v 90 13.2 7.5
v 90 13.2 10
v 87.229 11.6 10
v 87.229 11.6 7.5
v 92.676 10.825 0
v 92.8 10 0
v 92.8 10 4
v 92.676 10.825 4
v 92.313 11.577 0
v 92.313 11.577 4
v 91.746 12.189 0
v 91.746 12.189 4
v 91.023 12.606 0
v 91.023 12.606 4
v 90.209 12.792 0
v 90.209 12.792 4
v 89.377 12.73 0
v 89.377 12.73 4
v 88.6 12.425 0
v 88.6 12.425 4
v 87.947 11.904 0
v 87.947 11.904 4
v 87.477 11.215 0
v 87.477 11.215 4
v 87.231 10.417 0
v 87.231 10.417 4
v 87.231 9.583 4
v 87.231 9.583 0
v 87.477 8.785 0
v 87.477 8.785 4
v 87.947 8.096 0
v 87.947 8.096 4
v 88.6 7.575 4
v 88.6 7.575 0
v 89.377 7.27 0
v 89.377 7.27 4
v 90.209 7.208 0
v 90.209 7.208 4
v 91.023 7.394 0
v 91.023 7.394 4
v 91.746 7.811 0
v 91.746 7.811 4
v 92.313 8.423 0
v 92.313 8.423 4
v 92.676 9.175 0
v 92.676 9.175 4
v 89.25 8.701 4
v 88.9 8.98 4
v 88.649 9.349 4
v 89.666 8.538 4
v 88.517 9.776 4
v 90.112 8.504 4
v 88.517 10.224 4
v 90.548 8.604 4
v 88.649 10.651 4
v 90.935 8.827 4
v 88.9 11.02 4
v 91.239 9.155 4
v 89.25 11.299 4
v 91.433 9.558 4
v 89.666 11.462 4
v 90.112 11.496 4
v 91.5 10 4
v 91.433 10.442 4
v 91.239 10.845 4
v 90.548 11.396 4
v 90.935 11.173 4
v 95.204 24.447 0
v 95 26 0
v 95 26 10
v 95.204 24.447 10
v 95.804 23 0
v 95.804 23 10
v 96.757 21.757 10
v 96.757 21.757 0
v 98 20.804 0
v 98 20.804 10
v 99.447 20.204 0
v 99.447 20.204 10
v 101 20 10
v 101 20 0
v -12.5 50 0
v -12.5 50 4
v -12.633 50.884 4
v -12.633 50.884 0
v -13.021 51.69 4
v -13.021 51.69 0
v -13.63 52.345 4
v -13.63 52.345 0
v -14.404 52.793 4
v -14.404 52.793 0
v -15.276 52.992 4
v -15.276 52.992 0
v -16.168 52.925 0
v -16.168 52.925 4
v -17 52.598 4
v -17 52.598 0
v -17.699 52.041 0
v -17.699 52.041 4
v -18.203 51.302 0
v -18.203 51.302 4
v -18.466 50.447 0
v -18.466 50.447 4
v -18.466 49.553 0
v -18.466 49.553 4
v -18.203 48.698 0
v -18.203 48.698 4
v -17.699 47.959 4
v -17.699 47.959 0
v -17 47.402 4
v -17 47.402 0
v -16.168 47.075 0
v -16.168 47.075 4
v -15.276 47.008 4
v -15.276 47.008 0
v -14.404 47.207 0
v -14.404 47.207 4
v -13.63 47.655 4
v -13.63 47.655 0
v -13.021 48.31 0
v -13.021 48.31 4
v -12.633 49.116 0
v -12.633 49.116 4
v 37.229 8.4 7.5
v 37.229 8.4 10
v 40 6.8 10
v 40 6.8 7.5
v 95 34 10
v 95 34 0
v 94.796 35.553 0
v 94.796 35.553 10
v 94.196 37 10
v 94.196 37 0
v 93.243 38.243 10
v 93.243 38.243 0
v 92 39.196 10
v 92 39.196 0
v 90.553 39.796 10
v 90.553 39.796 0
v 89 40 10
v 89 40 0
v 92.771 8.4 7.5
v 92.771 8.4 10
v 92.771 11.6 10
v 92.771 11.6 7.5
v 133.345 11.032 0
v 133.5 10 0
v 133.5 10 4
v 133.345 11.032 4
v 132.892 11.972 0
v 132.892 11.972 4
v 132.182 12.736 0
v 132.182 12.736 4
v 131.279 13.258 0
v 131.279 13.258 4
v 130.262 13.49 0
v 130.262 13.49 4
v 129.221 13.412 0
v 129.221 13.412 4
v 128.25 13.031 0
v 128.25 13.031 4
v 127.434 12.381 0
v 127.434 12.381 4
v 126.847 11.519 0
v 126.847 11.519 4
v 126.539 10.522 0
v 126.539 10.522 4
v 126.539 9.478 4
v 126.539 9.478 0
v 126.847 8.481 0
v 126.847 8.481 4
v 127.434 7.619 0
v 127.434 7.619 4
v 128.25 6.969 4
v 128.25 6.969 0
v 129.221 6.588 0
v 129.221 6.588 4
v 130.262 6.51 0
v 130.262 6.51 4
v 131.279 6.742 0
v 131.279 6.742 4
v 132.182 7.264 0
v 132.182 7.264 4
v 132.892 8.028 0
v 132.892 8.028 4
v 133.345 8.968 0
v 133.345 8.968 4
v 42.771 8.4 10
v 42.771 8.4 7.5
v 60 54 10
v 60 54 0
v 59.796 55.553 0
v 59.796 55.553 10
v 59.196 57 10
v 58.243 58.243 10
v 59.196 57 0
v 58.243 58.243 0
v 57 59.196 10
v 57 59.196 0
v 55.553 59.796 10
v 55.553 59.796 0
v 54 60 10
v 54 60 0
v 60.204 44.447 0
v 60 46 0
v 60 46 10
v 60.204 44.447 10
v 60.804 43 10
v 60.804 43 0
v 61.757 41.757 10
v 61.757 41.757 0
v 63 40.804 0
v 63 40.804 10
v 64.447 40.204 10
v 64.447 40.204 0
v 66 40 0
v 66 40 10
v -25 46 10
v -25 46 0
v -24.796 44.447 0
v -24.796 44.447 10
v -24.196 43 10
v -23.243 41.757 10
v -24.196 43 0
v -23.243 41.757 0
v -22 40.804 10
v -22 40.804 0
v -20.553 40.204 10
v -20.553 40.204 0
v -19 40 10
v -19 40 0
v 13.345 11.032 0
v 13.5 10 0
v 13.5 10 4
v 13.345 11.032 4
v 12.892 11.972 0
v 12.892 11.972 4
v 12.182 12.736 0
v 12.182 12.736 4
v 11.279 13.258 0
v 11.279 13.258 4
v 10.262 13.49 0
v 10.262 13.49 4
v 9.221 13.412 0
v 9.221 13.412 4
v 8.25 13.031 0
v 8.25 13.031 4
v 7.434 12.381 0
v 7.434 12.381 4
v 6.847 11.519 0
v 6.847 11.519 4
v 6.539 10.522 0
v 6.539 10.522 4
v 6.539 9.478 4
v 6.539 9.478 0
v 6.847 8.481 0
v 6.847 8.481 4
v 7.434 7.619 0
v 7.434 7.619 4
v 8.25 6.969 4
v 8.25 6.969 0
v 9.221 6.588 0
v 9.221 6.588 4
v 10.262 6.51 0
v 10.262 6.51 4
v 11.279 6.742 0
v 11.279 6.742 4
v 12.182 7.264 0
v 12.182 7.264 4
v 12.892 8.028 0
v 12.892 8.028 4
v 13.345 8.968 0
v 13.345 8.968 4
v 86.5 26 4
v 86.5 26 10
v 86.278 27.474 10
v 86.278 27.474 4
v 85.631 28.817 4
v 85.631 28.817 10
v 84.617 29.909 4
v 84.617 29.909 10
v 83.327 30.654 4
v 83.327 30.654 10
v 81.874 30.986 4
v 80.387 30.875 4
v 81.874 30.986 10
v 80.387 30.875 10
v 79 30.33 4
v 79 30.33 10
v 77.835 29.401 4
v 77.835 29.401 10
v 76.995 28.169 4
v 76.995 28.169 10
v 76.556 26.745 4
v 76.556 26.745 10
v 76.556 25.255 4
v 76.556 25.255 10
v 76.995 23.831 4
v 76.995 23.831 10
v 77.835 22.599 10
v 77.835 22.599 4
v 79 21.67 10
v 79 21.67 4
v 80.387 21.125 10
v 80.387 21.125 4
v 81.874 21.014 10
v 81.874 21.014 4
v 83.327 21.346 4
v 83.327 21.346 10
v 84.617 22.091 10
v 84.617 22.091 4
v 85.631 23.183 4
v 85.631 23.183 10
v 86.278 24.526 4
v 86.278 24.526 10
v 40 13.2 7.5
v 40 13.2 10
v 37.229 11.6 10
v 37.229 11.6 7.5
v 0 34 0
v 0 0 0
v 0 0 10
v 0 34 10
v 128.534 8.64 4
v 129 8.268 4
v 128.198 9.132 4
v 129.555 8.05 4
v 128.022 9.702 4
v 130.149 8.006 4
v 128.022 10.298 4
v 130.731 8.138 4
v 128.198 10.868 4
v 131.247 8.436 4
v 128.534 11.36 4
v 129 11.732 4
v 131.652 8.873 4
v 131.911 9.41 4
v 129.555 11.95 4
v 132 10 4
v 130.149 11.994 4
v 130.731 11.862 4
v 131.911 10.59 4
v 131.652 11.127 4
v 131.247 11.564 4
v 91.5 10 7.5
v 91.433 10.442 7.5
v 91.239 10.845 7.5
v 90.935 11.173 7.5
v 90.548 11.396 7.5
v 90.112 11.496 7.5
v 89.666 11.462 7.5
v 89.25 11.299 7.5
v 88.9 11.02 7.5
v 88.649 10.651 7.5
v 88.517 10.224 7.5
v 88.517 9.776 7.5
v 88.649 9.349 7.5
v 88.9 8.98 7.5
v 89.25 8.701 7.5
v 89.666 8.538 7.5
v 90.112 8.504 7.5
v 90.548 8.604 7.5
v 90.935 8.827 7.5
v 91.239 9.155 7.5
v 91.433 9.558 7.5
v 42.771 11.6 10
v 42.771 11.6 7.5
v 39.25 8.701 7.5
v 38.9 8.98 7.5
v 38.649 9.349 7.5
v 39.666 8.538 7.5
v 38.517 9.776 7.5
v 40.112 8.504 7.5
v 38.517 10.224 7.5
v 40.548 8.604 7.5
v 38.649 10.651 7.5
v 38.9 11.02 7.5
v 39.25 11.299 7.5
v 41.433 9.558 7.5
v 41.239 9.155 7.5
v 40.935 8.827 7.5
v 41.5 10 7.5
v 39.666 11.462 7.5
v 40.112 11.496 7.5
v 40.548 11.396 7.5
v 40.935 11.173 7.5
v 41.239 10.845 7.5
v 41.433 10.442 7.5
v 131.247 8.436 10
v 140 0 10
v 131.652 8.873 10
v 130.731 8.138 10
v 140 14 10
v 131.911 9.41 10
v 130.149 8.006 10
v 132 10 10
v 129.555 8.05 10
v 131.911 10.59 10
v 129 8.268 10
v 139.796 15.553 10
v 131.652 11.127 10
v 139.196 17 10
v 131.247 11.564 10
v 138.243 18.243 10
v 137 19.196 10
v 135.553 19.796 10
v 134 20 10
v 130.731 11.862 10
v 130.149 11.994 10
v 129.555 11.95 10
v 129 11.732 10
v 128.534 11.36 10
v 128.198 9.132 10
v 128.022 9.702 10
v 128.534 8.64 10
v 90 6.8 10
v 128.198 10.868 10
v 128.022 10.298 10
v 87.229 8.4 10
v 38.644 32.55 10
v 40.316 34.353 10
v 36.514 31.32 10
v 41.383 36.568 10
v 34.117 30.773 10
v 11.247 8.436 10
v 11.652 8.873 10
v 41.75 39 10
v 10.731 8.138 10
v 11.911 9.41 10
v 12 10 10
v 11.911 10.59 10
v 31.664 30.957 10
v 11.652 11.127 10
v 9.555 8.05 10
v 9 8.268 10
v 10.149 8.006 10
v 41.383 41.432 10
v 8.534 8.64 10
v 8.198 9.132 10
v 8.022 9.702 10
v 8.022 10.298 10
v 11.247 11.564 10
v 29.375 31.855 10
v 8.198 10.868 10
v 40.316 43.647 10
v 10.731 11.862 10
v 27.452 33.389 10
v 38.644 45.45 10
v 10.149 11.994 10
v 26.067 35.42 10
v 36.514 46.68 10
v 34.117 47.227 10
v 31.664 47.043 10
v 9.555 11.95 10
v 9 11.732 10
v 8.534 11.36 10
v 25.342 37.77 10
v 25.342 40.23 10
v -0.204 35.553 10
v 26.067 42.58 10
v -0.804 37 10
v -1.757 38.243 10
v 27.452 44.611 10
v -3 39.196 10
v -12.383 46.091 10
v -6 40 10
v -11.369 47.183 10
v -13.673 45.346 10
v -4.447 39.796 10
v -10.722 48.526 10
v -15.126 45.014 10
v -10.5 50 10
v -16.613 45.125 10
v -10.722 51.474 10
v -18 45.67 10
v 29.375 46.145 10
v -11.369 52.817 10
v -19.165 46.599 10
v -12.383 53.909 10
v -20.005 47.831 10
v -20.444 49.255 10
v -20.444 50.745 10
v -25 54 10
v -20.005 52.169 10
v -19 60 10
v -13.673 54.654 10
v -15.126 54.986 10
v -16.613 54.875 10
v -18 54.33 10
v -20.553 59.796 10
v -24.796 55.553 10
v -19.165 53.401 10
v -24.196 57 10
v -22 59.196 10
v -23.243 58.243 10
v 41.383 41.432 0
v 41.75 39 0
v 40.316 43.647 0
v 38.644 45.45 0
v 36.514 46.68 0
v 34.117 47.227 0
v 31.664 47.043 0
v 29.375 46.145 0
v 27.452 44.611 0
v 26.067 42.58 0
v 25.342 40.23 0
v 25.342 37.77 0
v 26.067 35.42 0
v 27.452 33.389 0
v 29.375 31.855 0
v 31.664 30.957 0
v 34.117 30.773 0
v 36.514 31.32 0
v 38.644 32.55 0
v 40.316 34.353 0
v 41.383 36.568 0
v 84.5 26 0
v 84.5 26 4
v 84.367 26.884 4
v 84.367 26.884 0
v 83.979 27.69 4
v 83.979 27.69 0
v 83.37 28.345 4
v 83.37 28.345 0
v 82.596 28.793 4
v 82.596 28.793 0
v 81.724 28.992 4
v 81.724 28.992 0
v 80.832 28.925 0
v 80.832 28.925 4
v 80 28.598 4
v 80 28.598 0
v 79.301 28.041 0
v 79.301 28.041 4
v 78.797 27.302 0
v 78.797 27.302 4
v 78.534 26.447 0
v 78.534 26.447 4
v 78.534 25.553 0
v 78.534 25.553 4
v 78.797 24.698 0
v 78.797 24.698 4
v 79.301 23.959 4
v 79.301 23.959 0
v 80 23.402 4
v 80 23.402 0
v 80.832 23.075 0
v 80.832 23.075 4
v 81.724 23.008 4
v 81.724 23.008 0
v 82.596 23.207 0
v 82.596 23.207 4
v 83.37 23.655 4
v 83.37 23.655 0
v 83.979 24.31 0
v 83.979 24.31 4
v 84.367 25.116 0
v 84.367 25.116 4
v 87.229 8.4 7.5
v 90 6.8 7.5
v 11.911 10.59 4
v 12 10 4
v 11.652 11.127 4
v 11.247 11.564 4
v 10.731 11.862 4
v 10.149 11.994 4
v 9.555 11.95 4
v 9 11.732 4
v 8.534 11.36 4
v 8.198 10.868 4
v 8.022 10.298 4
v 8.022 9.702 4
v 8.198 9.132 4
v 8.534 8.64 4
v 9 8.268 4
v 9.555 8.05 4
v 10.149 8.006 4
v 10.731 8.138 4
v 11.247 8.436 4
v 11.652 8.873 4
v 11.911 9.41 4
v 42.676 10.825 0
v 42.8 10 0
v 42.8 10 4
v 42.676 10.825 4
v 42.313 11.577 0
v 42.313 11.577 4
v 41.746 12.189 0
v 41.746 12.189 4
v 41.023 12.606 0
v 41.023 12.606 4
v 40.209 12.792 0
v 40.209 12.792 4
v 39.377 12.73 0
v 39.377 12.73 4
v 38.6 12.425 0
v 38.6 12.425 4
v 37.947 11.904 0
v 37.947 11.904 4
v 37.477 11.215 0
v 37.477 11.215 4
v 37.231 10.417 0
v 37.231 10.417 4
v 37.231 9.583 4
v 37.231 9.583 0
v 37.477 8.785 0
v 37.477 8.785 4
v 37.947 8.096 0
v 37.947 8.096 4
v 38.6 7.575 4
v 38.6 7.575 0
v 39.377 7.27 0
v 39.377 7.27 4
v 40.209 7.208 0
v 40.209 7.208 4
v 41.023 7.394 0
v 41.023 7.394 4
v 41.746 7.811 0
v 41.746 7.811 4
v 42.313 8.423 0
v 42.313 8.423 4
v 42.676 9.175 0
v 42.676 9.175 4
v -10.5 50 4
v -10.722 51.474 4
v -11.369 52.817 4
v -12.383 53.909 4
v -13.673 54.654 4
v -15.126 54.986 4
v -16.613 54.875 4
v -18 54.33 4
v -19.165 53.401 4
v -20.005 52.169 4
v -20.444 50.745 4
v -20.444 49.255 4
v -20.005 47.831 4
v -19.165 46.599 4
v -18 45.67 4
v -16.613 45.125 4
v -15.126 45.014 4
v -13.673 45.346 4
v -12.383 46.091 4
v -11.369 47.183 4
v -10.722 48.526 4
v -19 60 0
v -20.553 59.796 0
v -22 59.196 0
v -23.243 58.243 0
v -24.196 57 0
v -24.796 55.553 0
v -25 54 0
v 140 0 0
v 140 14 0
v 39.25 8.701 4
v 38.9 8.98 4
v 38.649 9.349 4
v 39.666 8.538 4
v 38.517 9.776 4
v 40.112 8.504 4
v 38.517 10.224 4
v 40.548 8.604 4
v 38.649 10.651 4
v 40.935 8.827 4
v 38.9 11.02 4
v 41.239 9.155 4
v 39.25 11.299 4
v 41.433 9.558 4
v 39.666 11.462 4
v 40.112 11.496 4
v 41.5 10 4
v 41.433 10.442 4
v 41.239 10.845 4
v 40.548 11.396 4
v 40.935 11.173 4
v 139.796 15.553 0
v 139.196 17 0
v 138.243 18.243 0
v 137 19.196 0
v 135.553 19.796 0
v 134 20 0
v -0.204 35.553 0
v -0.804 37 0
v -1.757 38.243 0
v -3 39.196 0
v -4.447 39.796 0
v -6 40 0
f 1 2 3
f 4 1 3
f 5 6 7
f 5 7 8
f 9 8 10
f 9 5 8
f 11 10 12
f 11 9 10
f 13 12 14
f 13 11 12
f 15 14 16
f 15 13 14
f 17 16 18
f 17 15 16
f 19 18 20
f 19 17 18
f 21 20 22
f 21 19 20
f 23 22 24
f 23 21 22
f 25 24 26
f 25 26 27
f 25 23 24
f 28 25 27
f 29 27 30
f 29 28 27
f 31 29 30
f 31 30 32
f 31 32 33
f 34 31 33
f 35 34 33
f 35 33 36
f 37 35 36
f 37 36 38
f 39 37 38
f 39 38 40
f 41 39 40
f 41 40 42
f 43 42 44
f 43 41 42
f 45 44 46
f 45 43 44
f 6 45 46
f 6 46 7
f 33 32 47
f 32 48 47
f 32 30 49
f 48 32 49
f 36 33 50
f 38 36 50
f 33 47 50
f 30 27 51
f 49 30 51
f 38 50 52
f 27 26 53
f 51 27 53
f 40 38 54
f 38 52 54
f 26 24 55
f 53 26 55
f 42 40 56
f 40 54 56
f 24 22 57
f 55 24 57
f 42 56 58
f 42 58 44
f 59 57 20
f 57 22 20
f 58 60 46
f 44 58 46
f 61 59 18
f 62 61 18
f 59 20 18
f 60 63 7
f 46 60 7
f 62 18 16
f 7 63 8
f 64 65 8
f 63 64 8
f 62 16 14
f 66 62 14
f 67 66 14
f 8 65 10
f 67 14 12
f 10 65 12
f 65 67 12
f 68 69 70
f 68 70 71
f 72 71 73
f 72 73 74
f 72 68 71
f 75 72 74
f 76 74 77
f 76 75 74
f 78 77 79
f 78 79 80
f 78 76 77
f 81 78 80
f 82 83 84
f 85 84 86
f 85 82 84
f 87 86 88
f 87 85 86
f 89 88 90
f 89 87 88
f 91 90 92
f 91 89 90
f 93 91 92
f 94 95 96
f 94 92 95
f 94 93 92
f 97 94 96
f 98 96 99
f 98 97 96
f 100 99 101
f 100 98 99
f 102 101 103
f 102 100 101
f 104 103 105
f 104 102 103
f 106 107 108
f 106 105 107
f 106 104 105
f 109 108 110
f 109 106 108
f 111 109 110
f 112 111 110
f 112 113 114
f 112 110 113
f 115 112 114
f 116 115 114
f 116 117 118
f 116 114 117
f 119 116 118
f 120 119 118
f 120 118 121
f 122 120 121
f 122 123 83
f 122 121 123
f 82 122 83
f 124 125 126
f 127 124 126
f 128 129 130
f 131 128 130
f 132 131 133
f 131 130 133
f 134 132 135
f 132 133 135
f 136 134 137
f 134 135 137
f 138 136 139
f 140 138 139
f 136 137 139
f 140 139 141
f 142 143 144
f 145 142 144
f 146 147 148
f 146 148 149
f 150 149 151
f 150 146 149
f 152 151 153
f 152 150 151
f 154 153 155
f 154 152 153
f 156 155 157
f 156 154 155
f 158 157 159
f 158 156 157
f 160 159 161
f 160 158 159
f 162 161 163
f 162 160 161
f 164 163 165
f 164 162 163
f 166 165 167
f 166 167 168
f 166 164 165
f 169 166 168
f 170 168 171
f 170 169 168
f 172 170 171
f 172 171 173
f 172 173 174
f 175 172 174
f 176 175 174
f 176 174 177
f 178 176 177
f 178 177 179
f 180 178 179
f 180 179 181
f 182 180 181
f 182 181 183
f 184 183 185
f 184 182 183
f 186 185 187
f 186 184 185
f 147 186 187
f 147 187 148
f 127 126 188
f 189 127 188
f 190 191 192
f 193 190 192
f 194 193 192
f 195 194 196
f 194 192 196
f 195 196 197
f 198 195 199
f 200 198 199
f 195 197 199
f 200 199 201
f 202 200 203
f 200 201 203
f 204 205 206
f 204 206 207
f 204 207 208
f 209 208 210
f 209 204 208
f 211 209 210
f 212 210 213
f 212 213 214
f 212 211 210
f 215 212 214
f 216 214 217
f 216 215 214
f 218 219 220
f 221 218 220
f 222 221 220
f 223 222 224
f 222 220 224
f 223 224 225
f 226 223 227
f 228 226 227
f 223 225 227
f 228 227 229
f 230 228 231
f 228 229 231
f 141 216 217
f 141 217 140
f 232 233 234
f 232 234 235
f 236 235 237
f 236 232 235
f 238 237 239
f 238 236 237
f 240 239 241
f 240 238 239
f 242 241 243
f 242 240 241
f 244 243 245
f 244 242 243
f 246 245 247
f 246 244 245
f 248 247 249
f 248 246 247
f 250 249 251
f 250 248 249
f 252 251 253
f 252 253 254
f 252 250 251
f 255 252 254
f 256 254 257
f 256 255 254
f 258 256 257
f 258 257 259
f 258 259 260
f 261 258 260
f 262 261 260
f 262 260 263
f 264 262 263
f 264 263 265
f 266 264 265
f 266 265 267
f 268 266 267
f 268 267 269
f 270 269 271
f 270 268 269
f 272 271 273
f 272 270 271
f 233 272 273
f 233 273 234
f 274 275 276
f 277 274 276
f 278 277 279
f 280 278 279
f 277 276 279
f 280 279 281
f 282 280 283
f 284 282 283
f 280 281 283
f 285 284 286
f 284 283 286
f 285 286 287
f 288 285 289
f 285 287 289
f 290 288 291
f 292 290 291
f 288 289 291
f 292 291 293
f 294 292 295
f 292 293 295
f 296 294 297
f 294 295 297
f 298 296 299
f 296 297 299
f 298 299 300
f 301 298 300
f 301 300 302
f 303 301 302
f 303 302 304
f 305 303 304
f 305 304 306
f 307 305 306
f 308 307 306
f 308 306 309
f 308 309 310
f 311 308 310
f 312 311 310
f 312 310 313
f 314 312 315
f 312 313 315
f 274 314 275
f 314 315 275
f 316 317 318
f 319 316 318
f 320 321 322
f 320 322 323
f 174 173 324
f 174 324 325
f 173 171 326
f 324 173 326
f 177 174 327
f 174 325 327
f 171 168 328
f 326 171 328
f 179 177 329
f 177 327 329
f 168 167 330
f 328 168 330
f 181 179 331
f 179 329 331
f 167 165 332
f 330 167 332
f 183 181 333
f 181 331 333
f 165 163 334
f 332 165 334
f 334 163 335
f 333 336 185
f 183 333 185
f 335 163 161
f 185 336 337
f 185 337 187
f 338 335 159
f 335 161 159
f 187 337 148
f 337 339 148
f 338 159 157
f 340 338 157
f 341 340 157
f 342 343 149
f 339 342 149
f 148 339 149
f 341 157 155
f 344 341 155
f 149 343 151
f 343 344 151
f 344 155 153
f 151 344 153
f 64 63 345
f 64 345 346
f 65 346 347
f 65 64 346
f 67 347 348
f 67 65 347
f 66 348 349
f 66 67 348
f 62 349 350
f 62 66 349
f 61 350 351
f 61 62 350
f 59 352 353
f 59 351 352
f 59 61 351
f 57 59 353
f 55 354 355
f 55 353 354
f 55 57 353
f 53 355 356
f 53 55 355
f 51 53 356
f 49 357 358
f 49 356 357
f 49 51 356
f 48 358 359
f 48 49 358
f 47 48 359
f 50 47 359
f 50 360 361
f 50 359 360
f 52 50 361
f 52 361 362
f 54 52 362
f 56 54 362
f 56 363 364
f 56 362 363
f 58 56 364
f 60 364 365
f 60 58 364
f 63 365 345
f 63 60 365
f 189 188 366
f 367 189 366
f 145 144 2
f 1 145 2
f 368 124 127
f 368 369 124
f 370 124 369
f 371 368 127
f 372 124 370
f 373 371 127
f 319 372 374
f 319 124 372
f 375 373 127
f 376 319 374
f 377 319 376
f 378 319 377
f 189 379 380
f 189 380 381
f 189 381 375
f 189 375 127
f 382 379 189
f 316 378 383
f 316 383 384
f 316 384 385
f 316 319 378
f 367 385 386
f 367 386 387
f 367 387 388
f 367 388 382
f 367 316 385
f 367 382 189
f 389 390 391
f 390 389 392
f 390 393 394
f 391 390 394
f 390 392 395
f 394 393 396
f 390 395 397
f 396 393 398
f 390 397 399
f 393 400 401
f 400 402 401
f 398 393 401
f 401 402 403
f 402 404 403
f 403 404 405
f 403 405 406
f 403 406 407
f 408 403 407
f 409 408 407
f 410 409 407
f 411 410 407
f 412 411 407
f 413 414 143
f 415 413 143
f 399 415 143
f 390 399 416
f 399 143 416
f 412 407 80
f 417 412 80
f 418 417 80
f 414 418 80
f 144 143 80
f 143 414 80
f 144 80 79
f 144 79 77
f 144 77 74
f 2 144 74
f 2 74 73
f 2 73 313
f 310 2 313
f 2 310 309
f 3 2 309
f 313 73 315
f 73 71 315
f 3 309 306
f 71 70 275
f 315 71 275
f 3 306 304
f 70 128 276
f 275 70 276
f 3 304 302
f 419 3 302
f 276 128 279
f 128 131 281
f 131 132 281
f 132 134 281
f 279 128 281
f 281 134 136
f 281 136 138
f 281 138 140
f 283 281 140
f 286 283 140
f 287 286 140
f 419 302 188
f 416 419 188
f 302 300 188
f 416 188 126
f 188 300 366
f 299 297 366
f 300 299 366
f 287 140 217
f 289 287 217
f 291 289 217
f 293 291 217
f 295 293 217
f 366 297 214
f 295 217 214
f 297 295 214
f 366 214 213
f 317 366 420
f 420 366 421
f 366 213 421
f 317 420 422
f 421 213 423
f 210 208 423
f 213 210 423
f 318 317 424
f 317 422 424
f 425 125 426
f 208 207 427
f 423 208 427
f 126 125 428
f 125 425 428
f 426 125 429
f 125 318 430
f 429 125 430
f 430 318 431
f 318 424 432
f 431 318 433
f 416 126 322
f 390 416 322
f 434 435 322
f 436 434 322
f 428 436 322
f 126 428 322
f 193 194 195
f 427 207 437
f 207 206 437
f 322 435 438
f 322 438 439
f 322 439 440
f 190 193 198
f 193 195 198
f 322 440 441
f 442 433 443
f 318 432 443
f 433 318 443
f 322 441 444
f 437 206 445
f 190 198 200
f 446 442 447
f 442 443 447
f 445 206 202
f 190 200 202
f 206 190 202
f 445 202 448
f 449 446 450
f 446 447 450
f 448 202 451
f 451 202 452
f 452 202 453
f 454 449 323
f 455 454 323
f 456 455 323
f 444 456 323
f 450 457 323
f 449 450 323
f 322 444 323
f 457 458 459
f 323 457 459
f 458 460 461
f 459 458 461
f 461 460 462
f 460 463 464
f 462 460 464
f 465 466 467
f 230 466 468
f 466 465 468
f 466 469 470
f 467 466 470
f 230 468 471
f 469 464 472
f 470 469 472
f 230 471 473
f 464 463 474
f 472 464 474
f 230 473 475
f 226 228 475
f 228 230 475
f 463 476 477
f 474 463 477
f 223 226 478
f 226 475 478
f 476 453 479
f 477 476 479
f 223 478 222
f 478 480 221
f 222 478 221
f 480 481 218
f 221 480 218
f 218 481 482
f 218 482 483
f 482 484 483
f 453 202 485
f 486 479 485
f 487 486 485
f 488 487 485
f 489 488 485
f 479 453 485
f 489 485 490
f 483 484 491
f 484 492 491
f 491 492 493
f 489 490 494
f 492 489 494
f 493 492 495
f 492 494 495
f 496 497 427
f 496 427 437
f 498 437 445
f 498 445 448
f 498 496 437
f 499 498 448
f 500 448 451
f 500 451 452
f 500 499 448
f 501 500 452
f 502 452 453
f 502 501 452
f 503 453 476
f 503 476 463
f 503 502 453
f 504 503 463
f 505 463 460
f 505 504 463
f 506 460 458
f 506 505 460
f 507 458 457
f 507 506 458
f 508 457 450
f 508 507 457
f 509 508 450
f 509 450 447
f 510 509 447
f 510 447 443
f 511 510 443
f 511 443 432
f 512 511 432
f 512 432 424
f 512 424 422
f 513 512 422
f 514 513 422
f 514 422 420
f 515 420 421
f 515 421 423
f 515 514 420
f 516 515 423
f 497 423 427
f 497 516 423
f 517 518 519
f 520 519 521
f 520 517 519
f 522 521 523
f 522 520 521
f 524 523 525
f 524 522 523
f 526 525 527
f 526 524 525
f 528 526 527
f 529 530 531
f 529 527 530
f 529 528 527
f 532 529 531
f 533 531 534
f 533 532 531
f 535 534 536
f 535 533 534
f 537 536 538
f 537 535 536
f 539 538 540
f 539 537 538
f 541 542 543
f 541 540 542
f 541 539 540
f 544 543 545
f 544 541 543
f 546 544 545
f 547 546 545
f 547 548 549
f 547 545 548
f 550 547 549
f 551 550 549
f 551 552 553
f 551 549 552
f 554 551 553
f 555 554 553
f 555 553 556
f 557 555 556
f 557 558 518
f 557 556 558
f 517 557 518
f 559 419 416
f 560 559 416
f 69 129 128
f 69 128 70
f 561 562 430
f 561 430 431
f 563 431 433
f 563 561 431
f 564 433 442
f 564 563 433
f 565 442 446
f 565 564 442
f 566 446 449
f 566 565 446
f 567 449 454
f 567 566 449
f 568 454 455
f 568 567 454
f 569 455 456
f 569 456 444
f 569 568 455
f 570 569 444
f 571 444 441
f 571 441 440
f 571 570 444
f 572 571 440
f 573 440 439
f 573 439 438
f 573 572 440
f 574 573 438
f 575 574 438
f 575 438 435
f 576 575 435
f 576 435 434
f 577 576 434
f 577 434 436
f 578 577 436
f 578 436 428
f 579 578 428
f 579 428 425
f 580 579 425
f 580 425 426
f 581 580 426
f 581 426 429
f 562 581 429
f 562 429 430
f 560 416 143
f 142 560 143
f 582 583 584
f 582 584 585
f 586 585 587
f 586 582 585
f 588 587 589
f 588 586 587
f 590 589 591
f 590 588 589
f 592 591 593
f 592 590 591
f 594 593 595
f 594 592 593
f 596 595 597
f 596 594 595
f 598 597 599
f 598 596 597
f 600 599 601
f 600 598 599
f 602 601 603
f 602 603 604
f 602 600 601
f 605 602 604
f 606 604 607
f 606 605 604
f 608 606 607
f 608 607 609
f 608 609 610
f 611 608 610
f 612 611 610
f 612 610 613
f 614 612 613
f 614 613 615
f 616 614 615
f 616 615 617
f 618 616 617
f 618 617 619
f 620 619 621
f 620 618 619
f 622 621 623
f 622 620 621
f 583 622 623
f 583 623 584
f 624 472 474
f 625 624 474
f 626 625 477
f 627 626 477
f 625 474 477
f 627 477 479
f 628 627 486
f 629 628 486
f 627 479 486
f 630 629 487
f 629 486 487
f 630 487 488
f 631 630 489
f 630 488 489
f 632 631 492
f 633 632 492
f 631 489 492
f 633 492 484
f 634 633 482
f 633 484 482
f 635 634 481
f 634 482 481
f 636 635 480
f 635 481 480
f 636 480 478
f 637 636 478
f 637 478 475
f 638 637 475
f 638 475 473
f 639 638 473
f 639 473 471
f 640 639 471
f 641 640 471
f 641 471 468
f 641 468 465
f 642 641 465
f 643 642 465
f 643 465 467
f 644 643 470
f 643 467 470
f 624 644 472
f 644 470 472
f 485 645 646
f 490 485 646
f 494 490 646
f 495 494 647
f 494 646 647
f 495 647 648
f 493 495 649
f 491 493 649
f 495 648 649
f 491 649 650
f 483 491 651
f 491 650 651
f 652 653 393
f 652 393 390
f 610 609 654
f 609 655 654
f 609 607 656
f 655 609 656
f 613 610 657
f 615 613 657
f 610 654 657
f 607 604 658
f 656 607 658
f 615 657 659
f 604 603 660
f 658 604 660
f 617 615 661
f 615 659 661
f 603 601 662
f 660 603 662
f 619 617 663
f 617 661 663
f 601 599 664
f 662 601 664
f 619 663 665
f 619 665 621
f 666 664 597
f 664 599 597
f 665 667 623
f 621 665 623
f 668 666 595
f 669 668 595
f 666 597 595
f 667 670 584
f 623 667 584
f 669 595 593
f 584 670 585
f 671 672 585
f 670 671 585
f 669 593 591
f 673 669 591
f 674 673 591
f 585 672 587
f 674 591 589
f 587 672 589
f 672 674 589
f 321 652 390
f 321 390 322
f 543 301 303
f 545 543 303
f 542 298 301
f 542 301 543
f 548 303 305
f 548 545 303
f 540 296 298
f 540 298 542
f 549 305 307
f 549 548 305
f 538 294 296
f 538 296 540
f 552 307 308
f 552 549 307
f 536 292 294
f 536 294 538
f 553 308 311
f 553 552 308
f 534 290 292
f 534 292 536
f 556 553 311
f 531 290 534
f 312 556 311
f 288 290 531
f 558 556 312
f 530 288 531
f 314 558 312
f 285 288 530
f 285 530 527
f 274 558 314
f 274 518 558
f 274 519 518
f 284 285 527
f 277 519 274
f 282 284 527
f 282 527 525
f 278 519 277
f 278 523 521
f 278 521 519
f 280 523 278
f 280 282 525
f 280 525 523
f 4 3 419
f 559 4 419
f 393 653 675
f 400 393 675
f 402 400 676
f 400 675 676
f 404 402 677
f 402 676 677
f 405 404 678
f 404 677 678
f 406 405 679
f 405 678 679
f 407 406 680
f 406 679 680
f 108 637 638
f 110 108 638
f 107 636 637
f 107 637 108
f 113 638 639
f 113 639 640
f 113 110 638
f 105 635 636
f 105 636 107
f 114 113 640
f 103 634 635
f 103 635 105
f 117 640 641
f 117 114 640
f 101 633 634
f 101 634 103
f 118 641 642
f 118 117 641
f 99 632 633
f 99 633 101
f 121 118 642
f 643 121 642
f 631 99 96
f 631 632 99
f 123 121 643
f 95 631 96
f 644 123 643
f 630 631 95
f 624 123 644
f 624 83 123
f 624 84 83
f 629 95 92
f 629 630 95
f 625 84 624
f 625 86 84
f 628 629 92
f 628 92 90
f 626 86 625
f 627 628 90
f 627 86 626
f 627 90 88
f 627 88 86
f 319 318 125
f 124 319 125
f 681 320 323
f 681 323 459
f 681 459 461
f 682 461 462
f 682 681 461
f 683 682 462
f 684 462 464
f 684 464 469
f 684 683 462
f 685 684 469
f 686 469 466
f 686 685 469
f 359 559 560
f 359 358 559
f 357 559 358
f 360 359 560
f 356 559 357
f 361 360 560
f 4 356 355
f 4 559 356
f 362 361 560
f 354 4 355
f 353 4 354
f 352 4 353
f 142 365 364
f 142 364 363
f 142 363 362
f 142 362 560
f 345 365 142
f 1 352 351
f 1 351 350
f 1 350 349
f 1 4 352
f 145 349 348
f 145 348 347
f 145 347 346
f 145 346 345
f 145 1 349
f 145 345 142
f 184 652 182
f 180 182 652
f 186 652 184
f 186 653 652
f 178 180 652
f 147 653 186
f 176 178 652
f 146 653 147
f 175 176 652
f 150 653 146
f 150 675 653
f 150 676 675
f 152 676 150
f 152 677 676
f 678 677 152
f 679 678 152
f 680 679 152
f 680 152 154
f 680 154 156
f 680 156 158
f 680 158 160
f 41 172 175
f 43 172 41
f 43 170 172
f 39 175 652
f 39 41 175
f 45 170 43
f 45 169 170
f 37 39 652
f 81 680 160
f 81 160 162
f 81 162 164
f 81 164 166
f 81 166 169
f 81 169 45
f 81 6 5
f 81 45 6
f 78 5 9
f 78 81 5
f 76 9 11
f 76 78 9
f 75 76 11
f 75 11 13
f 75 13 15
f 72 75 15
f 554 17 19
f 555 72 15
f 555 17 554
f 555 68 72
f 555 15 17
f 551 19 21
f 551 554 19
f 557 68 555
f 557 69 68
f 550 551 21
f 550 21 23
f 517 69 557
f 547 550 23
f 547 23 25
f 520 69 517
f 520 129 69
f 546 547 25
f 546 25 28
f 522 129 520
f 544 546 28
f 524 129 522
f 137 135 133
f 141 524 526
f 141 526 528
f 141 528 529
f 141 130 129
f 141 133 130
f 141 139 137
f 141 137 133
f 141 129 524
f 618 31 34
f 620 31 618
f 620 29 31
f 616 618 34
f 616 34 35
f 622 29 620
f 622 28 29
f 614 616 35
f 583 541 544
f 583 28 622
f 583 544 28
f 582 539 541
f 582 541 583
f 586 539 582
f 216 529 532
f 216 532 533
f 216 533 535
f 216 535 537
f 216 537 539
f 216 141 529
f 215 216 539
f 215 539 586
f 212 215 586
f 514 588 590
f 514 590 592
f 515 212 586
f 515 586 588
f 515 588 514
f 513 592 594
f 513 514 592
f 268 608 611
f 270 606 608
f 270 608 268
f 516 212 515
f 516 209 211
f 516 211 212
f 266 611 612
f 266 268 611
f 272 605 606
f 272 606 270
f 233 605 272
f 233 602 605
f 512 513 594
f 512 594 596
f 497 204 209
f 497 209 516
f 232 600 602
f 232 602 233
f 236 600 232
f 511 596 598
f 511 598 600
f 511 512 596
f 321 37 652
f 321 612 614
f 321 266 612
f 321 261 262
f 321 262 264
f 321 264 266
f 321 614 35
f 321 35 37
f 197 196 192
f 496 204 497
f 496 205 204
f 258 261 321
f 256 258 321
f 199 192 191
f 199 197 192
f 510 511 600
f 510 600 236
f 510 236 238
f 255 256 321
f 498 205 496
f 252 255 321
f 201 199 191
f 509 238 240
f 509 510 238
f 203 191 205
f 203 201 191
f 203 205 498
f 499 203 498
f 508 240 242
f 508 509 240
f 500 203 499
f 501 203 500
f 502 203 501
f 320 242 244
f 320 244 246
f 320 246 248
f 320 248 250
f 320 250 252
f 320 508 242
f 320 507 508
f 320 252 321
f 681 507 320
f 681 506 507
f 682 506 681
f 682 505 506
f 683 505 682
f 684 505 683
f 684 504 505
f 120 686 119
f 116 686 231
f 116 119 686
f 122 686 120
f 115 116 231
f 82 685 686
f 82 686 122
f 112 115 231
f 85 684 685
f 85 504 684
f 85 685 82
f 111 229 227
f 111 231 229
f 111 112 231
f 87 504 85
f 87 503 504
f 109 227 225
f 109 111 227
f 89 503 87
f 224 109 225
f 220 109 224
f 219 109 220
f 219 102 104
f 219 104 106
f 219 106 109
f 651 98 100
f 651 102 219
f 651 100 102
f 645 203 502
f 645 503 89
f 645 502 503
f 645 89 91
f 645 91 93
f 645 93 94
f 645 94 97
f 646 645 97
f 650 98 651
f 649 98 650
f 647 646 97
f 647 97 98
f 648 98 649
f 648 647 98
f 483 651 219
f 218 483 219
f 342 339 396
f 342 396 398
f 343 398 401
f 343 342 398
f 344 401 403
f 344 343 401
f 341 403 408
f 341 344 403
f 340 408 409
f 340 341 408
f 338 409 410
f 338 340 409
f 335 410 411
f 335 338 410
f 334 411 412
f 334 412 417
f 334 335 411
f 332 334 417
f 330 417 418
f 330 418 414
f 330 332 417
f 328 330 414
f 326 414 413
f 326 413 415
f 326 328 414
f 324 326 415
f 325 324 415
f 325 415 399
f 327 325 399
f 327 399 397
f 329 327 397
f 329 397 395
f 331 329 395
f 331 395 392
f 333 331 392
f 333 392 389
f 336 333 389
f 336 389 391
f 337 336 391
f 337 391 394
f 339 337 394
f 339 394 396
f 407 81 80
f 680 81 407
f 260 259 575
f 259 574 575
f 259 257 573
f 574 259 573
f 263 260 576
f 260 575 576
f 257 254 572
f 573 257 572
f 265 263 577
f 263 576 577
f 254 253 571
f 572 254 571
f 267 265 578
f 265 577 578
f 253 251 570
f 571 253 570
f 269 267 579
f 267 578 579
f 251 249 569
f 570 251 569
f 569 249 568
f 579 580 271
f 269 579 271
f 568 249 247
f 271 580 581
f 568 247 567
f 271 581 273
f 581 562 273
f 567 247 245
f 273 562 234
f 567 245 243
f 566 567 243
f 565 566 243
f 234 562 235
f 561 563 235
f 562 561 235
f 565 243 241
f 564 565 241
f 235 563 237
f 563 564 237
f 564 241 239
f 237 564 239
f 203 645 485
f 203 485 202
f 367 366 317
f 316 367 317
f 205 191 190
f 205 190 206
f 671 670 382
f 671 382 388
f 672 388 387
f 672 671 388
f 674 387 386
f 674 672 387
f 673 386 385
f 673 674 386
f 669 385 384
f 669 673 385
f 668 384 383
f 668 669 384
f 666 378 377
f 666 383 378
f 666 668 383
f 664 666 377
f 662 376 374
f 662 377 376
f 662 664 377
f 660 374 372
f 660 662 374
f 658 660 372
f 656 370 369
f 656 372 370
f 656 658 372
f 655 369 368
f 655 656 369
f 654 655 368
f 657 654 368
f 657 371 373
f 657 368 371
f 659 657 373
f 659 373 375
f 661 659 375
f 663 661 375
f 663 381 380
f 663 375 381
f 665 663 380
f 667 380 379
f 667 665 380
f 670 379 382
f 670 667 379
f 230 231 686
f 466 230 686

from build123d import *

# Parameters (mm, degrees)
SKETCH_R        = 2
SKETCH_R_2      = 8.25
SKETCH_R_3      = 3
SKETCH_R_4      = 1.5
PAD_DEPTH       = 10
SKETCH004_R     = 3.5
SKETCH004_R_2   = 2.8
POCKET_DEPTH    = 4
POCKET001_DEPTH = 2.5
SKETCH006_R     = 5
POCKET002_DEPTH = 6


with BuildPart() as part:
    # Sketch → Pad (new body)
    with BuildSketch(Plane.XY):
        with BuildLine():
            Line((0, 0), (0, 34))
            ThreePointArc((0, 34), (-1.757359, 38.242641), (-6, 40))
            Line((-19, 40), (-6, 40))
            ThreePointArc((-25, 46), (-23.242641, 41.757359), (-19, 40))
            Line((-25, 54), (-25, 46))
            ThreePointArc((-19, 60), (-23.242641, 58.242641), (-25, 54))
            Line((-19, 60), (54, 60))
            ThreePointArc((60, 54), (58.242641, 58.242641), (54, 60))
            Line((60, 54), (60, 46))
            ThreePointArc((60, 46), (61.757359, 41.757359), (66, 40))
            Line((66, 40), (89, 40))
            ThreePointArc((95, 34), (93.242641, 38.242641), (89, 40))
            Line((95, 34), (95, 26))
            ThreePointArc((95, 26), (96.757359, 21.757359), (101, 20))
            Line((101, 20), (134, 20))
            ThreePointArc((140, 14), (138.242641, 18.242641), (134, 20))
            Line((140, 14), (140, 0))
            Line((140, 0), (0, 0))
        make_face()
        with Locations((10, 10)):
            Circle(SKETCH_R, mode=Mode.SUBTRACT)
        with Locations((33.5, 39)):
            Circle(SKETCH_R_2, mode=Mode.SUBTRACT)
        with Locations((81.5, 26)):
            Circle(SKETCH_R_3, mode=Mode.SUBTRACT)
        with Locations((130, 10)):
            Circle(SKETCH_R, mode=Mode.SUBTRACT)
        with Locations((40, 10)):
            Circle(SKETCH_R_4, mode=Mode.SUBTRACT)
        with Locations((90, 10)):
            Circle(SKETCH_R_4, mode=Mode.SUBTRACT)
        with Locations((-15.5, 50)):
            Circle(SKETCH_R_3, mode=Mode.SUBTRACT)
    extrude(amount=PAD_DEPTH)

    # Sketch004 → Pocket (cut)
    with BuildSketch(Plane.XY):
        with Locations((10, 10)):
            Circle(SKETCH004_R)
        with Locations((40, 10)):
            Circle(SKETCH004_R_2)
        with Locations((130, 10)):
            Circle(SKETCH004_R)
        with Locations((90, 10)):
            Circle(SKETCH004_R_2)
    extrude(amount=POCKET_DEPTH, mode=Mode.SUBTRACT)

    # Sketch005 (on Face5 of Pocket) → Pocket001 (cut)
    with BuildSketch(Plane.XY.offset(10)):
        Polygon((40, 6.8), (42.771281, 8.4), (42.771281, 11.6), (40, 13.2), (37.228719, 11.6), (37.228719, 8.4), align=None)
        Polygon((90, 6.8), (92.771281, 8.4), (92.771281, 11.6), (90, 13.2), (87.228719, 11.6), (87.228719, 8.4), align=None)
    extrude(amount=-POCKET001_DEPTH, mode=Mode.SUBTRACT)

    # Sketch006 (on Face5 of Pocket) → Pocket002 (cut)
    with BuildSketch(Plane.XY.offset(10)):
        with Locations((81.5, 26)):
            Circle(SKETCH006_R)
        with Locations((-15.5, 50)):
            Circle(SKETCH006_R)
    extrude(amount=-POCKET002_DEPTH, mode=Mode.SUBTRACT)


solid = part.part
